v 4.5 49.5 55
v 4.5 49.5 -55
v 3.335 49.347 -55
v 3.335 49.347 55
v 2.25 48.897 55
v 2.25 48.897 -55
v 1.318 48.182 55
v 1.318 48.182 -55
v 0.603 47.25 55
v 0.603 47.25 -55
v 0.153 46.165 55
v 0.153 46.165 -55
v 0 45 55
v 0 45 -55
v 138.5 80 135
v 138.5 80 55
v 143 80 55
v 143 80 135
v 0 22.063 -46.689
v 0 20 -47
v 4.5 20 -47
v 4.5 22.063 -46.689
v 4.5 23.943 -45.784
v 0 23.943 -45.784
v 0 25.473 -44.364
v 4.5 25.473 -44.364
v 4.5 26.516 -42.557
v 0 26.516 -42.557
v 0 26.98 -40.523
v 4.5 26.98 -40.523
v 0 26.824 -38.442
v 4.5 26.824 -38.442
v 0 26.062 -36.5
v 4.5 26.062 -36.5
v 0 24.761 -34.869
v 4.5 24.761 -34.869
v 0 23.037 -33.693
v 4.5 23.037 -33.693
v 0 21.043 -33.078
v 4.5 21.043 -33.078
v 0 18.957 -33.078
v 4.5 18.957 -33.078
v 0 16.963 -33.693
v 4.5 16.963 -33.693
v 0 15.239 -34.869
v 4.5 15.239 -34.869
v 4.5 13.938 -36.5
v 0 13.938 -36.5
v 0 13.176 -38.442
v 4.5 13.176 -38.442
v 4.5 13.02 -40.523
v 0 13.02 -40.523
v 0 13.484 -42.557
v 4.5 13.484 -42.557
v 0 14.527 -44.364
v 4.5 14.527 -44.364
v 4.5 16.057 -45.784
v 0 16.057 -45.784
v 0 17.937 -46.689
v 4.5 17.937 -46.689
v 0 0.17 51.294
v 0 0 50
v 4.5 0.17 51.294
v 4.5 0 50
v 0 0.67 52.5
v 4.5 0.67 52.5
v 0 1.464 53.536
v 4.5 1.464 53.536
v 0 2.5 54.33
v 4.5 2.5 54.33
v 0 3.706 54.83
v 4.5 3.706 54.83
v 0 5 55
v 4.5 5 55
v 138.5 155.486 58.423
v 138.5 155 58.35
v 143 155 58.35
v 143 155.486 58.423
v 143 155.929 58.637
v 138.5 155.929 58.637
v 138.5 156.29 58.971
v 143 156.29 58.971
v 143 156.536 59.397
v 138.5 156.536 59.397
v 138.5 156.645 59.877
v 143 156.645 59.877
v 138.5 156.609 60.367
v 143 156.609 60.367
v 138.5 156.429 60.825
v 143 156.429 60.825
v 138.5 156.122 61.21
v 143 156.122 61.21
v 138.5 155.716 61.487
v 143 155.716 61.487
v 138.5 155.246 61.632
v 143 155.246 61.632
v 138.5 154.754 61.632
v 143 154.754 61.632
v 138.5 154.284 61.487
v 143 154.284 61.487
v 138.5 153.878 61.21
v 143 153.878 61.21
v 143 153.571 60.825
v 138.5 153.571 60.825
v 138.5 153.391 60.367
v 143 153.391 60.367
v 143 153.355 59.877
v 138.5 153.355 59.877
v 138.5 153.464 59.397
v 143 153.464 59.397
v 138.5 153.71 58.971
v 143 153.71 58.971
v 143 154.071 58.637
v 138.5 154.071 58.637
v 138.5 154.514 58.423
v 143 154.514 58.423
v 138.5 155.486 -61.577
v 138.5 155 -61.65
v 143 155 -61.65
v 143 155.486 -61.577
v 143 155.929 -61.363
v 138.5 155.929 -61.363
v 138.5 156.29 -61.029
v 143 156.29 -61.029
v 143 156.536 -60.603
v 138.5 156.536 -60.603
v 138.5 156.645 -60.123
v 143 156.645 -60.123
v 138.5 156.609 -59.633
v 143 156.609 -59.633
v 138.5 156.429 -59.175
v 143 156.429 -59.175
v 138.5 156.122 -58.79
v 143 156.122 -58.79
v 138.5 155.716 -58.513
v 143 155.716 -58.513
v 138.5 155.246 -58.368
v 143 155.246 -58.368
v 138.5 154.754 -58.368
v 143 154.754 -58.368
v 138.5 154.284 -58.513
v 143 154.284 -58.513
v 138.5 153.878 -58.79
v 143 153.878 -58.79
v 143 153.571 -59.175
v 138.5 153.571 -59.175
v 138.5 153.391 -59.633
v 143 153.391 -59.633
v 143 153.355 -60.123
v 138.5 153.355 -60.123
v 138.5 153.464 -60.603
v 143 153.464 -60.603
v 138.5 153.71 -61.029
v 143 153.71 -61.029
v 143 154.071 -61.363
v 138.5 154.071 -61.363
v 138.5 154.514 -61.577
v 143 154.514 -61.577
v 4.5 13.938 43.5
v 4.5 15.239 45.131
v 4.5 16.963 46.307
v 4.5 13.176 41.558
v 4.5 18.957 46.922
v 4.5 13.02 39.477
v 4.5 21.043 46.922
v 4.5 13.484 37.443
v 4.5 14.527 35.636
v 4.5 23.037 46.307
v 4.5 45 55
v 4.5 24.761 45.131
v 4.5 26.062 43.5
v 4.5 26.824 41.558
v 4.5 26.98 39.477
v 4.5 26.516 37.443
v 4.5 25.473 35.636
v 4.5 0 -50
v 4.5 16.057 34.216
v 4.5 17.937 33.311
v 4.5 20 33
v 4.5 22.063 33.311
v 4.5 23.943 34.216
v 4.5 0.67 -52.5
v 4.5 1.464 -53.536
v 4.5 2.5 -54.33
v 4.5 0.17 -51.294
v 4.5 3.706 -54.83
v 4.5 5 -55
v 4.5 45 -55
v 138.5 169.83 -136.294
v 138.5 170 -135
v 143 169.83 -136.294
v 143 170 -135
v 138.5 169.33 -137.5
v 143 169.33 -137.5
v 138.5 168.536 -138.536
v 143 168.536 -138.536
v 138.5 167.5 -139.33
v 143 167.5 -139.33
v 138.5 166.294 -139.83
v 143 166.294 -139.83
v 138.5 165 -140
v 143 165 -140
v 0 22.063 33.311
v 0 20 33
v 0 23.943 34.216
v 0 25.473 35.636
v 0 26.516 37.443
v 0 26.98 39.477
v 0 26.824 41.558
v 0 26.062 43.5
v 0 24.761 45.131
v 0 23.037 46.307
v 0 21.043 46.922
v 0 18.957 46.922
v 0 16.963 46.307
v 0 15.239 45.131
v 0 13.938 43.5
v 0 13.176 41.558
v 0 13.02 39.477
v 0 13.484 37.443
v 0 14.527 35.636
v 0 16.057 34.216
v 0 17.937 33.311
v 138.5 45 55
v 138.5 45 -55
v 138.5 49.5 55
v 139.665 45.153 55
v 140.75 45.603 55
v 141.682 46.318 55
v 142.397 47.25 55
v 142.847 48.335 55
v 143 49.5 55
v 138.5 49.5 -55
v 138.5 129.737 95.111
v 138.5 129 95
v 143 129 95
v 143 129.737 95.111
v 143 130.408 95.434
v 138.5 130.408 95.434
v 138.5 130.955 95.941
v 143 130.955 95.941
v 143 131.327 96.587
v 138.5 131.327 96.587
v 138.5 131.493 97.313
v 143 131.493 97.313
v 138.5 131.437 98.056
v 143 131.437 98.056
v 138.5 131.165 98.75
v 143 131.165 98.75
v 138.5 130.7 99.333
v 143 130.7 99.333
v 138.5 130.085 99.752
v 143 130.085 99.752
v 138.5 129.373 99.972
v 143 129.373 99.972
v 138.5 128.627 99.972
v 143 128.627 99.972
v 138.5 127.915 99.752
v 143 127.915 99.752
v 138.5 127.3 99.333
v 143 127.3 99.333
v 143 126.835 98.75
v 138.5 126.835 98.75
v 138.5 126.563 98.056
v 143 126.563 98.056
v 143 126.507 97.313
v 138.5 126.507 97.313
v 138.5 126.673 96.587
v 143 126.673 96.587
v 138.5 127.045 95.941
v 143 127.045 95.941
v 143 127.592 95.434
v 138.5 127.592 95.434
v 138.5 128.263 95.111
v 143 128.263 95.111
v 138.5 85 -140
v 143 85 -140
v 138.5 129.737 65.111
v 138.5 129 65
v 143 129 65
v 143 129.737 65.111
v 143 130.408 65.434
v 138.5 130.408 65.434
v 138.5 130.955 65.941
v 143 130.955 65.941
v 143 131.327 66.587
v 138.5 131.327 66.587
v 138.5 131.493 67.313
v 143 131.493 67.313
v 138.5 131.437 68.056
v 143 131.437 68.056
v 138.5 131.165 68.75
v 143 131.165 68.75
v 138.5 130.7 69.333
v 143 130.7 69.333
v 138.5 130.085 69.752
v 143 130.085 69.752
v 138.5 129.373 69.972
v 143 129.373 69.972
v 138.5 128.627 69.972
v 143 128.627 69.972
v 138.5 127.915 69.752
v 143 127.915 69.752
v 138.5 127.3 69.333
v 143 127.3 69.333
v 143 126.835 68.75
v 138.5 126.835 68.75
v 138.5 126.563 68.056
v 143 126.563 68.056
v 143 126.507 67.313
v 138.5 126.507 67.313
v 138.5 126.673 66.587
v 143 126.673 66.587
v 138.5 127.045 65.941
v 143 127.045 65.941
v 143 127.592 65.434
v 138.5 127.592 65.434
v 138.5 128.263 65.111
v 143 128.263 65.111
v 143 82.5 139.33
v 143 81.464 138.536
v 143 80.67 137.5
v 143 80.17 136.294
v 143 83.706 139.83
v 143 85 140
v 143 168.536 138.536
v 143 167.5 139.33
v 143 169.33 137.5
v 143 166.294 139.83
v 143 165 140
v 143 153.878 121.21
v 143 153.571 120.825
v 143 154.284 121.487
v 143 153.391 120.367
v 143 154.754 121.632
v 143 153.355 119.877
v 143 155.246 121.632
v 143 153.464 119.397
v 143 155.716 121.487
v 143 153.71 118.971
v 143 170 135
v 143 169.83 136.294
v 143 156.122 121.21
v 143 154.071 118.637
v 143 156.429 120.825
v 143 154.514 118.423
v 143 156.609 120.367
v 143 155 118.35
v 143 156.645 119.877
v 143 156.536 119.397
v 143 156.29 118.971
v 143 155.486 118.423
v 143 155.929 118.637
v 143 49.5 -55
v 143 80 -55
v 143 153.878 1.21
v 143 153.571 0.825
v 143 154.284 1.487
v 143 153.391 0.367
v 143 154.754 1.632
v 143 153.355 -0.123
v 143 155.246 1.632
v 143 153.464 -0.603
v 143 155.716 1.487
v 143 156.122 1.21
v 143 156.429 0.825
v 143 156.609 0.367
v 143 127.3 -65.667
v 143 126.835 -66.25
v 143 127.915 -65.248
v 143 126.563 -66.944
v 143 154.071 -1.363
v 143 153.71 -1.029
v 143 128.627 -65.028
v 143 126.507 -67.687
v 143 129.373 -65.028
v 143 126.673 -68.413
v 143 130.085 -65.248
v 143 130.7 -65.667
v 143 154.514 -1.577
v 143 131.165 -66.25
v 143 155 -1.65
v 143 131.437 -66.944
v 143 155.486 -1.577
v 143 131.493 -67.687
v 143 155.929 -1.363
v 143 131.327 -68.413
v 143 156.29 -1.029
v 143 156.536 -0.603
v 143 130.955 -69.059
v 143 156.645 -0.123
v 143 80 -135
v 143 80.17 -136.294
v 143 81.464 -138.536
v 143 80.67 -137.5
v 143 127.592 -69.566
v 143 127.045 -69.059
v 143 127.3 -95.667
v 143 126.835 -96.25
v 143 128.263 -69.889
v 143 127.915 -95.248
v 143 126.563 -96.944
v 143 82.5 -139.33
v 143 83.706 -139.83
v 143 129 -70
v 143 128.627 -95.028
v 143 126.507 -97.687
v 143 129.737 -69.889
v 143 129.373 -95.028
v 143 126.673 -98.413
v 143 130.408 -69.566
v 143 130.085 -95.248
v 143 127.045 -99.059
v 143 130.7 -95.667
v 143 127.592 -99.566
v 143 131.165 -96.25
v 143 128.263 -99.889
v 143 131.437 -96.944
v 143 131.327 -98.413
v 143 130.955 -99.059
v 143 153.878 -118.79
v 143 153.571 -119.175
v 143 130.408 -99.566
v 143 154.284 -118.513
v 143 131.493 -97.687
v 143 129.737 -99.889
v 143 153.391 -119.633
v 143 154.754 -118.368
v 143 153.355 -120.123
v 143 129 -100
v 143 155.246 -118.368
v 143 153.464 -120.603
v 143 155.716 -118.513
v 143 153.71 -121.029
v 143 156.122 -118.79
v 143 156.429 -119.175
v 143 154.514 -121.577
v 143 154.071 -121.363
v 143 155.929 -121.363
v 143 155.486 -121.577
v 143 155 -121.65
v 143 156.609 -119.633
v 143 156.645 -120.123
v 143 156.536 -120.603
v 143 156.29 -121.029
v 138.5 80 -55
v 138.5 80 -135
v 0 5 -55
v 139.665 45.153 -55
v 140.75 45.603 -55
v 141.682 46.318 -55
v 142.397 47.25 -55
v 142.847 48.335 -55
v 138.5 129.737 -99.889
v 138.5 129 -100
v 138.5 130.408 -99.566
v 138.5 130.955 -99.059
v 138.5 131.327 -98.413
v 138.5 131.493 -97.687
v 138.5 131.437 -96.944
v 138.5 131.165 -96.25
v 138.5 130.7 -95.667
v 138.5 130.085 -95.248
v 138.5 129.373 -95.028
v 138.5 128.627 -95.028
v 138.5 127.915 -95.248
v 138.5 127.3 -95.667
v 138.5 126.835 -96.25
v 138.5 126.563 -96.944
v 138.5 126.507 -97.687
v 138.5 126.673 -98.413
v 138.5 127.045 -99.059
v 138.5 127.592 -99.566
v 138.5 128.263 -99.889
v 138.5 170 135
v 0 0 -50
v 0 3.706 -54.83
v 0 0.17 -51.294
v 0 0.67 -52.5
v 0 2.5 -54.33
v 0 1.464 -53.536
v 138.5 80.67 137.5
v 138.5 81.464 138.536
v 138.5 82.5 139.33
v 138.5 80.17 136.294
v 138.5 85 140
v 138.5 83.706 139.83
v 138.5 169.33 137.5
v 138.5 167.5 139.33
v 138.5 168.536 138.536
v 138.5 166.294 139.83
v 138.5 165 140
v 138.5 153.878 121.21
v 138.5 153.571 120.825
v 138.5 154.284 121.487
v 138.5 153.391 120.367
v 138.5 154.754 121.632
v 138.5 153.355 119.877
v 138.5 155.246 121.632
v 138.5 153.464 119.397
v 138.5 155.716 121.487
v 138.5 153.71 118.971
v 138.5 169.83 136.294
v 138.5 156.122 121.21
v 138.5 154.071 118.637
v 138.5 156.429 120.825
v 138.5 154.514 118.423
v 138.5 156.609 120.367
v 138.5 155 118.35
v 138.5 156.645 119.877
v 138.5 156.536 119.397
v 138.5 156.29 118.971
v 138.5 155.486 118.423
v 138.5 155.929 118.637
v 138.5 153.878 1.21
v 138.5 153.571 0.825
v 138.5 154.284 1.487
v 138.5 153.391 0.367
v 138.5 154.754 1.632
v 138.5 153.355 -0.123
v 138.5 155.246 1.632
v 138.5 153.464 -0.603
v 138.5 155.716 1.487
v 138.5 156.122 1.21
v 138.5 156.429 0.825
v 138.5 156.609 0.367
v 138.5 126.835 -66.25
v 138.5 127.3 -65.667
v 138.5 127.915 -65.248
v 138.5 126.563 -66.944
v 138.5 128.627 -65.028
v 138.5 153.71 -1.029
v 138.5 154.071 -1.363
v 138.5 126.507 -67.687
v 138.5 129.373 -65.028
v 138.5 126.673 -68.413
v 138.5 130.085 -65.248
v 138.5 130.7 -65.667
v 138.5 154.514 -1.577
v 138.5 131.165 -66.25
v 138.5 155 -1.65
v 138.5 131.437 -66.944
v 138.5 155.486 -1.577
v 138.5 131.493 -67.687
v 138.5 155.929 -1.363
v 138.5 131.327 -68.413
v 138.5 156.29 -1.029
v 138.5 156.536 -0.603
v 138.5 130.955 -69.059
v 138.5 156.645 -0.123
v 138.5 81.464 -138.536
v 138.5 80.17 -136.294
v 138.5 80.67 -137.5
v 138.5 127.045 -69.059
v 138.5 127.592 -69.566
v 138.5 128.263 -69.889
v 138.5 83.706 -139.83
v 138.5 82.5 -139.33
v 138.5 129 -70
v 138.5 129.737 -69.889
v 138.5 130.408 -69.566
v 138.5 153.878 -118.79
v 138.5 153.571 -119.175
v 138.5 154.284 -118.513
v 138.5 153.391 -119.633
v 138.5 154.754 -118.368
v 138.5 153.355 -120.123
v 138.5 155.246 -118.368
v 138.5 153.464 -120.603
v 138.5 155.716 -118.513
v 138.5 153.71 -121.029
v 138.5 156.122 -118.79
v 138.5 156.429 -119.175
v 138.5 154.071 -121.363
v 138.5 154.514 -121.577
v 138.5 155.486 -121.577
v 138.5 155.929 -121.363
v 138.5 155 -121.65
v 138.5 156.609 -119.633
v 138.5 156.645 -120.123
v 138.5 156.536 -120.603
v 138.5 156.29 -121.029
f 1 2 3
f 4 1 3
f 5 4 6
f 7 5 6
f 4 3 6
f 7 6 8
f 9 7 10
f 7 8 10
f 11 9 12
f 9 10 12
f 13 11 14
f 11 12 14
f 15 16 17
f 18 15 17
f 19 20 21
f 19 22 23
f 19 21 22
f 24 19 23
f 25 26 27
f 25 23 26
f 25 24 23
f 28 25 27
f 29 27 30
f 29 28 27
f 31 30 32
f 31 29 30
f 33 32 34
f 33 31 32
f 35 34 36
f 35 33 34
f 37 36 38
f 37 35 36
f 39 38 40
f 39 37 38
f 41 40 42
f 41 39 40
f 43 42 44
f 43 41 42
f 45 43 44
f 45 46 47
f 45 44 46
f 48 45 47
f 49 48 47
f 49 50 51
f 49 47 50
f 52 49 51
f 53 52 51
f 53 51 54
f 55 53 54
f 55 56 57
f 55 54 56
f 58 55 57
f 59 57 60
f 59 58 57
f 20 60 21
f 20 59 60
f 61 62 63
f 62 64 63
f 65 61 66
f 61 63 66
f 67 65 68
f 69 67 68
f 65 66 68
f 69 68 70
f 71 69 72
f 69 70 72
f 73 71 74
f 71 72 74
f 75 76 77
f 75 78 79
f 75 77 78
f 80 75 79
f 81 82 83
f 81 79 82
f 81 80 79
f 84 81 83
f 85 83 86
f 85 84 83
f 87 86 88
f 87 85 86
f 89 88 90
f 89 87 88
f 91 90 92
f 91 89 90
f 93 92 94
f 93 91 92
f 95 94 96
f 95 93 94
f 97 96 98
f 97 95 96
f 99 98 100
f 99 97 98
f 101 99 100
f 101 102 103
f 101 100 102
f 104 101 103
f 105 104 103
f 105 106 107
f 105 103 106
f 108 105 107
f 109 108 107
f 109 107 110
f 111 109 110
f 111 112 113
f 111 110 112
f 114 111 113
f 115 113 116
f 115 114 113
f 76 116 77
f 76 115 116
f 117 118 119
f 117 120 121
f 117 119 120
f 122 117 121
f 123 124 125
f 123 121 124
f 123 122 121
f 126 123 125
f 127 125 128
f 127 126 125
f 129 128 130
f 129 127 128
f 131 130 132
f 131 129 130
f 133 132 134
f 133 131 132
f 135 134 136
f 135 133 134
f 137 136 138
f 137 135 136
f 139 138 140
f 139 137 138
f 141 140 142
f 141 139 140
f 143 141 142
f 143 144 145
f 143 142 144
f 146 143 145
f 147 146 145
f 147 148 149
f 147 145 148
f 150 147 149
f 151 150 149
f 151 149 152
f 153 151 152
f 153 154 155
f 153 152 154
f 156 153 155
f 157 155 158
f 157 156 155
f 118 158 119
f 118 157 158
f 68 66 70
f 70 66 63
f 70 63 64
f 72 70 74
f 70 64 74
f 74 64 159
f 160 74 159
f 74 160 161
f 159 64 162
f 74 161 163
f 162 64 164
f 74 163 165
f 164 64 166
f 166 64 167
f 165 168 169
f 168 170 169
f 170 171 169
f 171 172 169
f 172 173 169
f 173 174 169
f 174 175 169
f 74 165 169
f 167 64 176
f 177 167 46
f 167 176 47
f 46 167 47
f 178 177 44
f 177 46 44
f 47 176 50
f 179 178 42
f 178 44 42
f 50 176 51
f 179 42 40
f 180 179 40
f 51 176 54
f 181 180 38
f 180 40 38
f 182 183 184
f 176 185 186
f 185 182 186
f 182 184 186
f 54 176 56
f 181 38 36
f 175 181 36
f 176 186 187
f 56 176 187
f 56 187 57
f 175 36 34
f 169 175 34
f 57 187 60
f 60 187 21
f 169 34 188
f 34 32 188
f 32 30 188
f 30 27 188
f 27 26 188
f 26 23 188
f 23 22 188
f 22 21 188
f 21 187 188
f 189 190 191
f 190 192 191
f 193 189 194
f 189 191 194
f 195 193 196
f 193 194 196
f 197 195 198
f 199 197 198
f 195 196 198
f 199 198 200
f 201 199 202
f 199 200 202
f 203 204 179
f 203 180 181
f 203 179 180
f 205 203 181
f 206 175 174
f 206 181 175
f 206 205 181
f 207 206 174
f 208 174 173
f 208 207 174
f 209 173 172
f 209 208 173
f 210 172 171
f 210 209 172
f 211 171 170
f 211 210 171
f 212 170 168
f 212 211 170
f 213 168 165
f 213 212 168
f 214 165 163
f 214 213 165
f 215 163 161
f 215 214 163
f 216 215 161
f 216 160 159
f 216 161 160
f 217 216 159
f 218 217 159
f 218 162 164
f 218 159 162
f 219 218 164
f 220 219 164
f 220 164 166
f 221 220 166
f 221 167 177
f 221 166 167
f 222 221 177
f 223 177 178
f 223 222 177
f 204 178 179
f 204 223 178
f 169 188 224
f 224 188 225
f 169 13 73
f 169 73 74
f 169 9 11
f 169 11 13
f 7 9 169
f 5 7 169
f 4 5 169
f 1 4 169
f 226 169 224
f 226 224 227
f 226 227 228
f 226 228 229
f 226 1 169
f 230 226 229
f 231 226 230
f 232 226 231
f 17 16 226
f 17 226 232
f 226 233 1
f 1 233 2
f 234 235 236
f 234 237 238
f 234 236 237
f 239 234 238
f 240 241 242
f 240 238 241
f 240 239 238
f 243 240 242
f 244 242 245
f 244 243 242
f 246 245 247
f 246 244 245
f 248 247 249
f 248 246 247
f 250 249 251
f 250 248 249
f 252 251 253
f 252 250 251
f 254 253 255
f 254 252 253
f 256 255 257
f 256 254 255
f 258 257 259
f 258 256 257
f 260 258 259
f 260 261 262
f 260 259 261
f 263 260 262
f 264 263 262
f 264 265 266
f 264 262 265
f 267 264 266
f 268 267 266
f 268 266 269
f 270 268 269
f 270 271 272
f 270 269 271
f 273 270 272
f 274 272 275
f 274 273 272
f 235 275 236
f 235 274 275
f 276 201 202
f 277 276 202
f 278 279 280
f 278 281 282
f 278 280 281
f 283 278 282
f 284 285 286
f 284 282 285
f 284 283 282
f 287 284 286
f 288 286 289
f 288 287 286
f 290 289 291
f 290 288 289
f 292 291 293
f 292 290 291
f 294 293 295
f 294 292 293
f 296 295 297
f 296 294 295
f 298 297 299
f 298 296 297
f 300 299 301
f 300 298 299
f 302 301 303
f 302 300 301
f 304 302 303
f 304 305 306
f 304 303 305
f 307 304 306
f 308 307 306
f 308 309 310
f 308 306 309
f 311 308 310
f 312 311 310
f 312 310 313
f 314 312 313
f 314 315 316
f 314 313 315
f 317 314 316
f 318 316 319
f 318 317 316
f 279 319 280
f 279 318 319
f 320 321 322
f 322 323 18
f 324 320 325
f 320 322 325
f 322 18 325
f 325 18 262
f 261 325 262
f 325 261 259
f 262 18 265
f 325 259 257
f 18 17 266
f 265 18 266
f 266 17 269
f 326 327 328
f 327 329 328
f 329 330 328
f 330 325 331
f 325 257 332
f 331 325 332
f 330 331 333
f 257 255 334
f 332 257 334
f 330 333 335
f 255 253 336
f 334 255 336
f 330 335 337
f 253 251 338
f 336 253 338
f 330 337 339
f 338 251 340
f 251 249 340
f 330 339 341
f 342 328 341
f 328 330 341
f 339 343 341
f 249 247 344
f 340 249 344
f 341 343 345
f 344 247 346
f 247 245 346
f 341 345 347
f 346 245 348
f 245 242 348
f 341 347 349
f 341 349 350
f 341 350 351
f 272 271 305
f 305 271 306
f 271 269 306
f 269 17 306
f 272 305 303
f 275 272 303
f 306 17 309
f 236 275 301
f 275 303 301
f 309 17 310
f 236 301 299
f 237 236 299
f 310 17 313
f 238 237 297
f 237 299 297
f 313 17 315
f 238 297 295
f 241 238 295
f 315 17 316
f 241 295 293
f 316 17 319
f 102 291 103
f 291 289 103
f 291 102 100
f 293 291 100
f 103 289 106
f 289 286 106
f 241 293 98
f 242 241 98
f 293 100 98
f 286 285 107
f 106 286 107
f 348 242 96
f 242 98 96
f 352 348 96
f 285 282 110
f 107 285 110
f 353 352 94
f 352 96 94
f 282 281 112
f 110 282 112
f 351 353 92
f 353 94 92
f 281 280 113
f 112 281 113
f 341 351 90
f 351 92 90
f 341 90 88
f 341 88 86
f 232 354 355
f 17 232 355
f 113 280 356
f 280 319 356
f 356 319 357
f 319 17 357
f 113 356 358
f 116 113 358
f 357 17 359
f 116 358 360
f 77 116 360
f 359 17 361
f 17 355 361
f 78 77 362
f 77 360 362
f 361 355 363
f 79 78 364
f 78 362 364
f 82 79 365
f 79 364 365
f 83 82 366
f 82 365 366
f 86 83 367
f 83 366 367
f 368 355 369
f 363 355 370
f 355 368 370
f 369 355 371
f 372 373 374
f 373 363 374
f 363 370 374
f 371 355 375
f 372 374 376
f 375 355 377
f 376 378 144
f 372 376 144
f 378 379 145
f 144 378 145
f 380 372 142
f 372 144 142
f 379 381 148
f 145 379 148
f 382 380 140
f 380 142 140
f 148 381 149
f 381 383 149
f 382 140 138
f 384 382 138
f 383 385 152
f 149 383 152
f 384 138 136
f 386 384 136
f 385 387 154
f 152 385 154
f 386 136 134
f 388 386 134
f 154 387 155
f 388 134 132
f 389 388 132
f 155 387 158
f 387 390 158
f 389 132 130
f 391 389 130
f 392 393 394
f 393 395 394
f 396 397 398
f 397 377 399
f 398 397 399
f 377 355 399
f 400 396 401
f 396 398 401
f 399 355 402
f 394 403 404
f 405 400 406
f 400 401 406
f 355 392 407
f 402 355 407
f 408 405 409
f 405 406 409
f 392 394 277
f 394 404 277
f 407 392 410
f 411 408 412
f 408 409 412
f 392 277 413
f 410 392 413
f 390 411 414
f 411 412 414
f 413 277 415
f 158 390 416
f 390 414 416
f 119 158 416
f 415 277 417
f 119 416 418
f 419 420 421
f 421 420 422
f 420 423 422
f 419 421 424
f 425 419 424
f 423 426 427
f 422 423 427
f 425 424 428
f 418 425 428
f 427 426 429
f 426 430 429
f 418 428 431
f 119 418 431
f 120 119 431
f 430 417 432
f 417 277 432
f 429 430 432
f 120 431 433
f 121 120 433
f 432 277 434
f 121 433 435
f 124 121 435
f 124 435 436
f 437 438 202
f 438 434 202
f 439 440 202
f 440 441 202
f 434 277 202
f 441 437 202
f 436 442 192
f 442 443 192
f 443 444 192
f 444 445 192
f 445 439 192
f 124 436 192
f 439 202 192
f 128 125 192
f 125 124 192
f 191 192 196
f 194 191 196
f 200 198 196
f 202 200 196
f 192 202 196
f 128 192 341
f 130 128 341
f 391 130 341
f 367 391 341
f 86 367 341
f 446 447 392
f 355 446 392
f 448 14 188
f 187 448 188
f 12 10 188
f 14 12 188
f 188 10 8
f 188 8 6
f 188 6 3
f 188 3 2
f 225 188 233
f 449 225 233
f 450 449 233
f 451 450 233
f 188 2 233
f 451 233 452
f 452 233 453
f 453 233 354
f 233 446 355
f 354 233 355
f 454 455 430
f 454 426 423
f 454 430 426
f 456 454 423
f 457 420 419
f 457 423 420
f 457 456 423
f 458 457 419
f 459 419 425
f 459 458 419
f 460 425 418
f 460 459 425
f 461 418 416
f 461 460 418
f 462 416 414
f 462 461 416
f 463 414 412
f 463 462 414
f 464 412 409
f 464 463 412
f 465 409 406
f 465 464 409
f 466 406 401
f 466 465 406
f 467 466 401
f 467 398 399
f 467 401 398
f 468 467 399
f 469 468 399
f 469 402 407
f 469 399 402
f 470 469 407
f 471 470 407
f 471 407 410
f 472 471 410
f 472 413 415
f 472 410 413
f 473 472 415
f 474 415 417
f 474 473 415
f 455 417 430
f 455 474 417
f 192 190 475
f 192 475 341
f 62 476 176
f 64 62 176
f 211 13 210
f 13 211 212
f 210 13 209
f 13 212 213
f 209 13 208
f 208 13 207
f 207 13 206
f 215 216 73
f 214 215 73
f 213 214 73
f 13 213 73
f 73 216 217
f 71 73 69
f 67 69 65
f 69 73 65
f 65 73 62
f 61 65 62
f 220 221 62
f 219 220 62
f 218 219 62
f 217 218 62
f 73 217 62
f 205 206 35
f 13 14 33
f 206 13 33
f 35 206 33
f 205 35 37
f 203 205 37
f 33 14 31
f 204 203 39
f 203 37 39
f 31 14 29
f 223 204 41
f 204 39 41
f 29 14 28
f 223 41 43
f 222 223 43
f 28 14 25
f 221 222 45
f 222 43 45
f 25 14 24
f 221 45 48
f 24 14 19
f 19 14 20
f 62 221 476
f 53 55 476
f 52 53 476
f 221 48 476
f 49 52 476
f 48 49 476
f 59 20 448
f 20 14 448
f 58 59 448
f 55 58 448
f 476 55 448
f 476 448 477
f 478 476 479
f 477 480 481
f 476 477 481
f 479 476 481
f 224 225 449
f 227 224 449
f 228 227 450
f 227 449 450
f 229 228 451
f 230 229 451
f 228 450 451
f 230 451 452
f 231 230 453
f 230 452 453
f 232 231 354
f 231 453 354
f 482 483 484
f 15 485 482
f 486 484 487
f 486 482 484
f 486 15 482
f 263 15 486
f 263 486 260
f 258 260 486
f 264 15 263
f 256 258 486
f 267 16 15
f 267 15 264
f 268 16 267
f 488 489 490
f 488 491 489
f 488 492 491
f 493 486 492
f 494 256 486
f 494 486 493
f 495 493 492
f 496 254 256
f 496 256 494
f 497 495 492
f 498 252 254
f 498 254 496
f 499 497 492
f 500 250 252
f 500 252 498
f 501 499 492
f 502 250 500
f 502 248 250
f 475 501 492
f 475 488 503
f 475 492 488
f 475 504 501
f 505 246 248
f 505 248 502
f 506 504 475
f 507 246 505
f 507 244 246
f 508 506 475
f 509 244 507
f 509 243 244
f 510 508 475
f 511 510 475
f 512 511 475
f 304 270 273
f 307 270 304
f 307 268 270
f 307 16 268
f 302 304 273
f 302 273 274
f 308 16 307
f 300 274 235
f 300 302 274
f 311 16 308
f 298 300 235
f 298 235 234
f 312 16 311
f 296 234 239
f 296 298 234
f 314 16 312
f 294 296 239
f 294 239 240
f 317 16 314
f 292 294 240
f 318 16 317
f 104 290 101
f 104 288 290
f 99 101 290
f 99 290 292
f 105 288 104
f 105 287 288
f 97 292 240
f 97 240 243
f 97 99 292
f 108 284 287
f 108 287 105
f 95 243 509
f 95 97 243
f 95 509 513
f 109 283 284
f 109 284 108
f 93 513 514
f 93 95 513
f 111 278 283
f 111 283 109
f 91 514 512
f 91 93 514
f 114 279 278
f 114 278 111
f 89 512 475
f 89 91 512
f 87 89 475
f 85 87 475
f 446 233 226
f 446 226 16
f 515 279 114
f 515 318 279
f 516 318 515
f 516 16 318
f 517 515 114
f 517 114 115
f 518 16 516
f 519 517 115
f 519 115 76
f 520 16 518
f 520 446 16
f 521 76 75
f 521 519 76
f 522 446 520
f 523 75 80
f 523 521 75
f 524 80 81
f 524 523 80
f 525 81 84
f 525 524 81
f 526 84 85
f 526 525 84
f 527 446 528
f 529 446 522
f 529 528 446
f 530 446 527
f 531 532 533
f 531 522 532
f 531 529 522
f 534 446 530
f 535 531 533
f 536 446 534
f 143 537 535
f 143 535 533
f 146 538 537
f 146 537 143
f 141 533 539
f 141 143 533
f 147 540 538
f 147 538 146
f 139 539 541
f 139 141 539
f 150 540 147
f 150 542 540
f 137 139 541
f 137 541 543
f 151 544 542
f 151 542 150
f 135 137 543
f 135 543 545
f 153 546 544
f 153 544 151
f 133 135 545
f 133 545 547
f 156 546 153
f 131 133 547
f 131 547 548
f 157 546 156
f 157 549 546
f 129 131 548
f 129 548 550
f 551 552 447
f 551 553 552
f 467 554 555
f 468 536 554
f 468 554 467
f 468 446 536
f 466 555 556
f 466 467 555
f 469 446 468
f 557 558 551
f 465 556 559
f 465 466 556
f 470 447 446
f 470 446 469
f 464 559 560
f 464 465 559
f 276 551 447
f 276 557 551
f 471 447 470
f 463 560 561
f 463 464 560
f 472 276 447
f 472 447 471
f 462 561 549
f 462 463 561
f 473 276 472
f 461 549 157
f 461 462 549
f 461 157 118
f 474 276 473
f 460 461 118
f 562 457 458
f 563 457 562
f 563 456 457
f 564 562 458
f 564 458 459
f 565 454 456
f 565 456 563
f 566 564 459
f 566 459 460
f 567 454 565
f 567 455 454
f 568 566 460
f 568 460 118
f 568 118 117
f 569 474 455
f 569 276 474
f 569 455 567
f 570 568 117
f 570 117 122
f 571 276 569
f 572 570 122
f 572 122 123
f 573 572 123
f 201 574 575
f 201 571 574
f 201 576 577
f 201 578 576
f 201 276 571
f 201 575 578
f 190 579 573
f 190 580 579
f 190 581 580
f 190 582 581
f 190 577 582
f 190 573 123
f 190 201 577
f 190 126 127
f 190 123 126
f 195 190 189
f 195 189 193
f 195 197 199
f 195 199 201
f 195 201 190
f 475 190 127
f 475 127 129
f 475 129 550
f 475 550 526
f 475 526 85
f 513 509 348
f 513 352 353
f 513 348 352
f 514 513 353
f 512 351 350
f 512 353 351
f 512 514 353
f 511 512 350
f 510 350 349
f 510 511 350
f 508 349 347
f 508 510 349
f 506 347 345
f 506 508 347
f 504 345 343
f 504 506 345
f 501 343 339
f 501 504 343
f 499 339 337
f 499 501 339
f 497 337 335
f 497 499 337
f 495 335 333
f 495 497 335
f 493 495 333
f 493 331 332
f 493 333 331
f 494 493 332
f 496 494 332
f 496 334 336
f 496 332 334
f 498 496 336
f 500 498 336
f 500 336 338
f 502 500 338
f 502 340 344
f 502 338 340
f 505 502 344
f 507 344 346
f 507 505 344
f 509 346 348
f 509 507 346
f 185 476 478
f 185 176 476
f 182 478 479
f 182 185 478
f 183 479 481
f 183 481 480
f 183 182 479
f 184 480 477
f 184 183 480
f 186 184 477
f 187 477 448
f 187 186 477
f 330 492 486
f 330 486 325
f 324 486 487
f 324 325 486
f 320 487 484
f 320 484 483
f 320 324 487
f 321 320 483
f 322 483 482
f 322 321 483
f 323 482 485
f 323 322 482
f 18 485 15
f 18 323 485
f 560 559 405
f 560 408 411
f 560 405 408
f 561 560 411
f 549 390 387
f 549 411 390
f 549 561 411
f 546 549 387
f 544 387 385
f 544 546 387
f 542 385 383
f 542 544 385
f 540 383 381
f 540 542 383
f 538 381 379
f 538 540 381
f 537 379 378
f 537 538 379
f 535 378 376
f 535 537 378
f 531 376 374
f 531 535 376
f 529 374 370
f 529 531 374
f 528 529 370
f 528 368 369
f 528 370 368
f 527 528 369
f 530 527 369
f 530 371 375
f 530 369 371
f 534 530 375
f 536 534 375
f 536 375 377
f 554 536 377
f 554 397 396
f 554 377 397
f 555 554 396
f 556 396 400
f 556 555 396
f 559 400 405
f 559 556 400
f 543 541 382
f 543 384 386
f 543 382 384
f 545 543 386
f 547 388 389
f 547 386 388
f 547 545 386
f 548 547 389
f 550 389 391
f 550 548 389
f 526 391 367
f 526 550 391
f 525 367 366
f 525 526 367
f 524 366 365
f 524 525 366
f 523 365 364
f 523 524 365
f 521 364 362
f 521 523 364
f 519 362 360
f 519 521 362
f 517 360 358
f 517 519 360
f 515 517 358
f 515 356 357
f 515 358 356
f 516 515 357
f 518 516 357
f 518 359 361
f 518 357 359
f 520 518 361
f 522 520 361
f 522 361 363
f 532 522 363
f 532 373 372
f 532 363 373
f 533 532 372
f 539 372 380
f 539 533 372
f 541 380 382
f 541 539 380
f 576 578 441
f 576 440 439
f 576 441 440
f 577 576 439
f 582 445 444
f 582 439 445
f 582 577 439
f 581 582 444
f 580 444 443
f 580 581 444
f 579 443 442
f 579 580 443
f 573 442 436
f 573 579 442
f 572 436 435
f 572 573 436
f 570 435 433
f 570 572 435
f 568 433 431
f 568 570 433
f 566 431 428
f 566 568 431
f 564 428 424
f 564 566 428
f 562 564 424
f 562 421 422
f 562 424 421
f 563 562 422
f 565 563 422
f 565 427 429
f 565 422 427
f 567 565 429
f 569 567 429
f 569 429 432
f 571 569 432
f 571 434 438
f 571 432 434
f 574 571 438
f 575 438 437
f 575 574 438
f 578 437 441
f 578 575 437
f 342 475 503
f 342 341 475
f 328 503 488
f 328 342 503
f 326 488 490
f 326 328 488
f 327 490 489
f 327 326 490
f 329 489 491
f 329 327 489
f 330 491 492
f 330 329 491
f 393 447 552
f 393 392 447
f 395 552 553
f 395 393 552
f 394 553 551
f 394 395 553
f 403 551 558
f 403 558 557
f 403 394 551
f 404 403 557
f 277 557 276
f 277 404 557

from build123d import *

# Parameters (mm, degrees)
EXTRUDE_1_DEPTH          = 55
EXTRUDE_1_DEPTH_BACK     = 55
EXTRUDE_2_DEPTH          = 140
EXTRUDE_2_DEPTH_BACK     = 140
SKETCH_2_W               = 4.5
SKETCH_2_H               = 90
FILLET_1_R               = 5
CUT_EXTRUDE_1_DEPTH      = 263.581415946
CUT_EXTRUDE_1_DEPTH_BACK = 263.581415946
SKETCH_3_R               = 7
SKETCH_3_R_2             = 1.65
SKETCH_3_R_3             = 2.5


with BuildPart() as part:
    # ｽｹｯﾁ1 → ﾎﾞｽ - 押し出し1 (new, two sides: drawn at the far end of the back side and taken through both)
    with BuildSketch(Plane.XY.offset(-EXTRUDE_1_DEPTH_BACK)):
        with BuildLine():
            Line((0, 0), (4.5, 0))
            Line((4.5, 0), (4.5, 45))
            Line((4.5, 45), (138.5, 45))
            ThreePointArc((138.5, 45), (141.681980515, 46.318019485), (143, 49.5))
            Line((143, 49.5), (143, 170))
            Line((143, 170), (138.5, 170))
            Line((138.5, 170), (138.5, 49.5))
            Line((138.5, 49.5), (4.5, 49.5))
            ThreePointArc((4.5, 49.5), (1.318019485, 48.181980515), (0, 45))
            Line((0, 45), (0, 0))
        make_face()
    extrude(amount=EXTRUDE_1_DEPTH + EXTRUDE_1_DEPTH_BACK)

    # ｽｹｯﾁ2 → ﾎﾞｽ - 押し出し2 (add, two sides: drawn at the far end of the back side and taken through both)
    with BuildSketch(Plane.XY.offset(-EXTRUDE_2_DEPTH_BACK)):
        with Locations((140.75, 125)):
            Rectangle(SKETCH_2_W, SKETCH_2_H)
    extrude(amount=EXTRUDE_2_DEPTH + EXTRUDE_2_DEPTH_BACK)

    # ﾌｨﾚｯﾄ1
    fillet_1_edges = [part.edges().sort_by_distance(p)[0] for p in [
        (2.25, 0, -55),
        (140.75, 80, -140),
        (140.75, 170, -140),
        (140.75, 80, 140),
        (140.75, 170, 140),
        (2.25, 0, 55),
    ]]
    fillet(fillet_1_edges, radius=FILLET_1_R)

    # ｽｹｯﾁ3 → ｶｯﾄ - 押し出し1 (cut, two sides: drawn at the far end of the back side and taken through both)
    with BuildSketch(Plane(origin=(0, 0, 0), x_dir=(0, 0, -1), z_dir=(1, 0, 0)).offset(-CUT_EXTRUDE_1_DEPTH_BACK)):
        with Locations((40, 20)):
            Circle(SKETCH_3_R)
        with Locations((-40, 20)):
            Circle(SKETCH_3_R)
        with Locations((0, 155)):
            Circle(SKETCH_3_R_2)
        with Locations((60, 155)):
            Circle(SKETCH_3_R_2)
        with Locations((-60, 155)):
            Circle(SKETCH_3_R_2)
        with Locations((120, 155)):
            Circle(SKETCH_3_R_2)
        with Locations((-120, 155)):
            Circle(SKETCH_3_R_2)
        with Locations((67.5, 129)):
            Circle(SKETCH_3_R_3)
        with Locations((-67.5, 129)):
            Circle(SKETCH_3_R_3)
        with Locations((97.5, 129)):
            Circle(SKETCH_3_R_3)
        with Locations((-97.5, 129)):
            Circle(SKETCH_3_R_3)
    extrude(amount=CUT_EXTRUDE_1_DEPTH + CUT_EXTRUDE_1_DEPTH_BACK, mode=Mode.SUBTRACT)


solid = part.part
